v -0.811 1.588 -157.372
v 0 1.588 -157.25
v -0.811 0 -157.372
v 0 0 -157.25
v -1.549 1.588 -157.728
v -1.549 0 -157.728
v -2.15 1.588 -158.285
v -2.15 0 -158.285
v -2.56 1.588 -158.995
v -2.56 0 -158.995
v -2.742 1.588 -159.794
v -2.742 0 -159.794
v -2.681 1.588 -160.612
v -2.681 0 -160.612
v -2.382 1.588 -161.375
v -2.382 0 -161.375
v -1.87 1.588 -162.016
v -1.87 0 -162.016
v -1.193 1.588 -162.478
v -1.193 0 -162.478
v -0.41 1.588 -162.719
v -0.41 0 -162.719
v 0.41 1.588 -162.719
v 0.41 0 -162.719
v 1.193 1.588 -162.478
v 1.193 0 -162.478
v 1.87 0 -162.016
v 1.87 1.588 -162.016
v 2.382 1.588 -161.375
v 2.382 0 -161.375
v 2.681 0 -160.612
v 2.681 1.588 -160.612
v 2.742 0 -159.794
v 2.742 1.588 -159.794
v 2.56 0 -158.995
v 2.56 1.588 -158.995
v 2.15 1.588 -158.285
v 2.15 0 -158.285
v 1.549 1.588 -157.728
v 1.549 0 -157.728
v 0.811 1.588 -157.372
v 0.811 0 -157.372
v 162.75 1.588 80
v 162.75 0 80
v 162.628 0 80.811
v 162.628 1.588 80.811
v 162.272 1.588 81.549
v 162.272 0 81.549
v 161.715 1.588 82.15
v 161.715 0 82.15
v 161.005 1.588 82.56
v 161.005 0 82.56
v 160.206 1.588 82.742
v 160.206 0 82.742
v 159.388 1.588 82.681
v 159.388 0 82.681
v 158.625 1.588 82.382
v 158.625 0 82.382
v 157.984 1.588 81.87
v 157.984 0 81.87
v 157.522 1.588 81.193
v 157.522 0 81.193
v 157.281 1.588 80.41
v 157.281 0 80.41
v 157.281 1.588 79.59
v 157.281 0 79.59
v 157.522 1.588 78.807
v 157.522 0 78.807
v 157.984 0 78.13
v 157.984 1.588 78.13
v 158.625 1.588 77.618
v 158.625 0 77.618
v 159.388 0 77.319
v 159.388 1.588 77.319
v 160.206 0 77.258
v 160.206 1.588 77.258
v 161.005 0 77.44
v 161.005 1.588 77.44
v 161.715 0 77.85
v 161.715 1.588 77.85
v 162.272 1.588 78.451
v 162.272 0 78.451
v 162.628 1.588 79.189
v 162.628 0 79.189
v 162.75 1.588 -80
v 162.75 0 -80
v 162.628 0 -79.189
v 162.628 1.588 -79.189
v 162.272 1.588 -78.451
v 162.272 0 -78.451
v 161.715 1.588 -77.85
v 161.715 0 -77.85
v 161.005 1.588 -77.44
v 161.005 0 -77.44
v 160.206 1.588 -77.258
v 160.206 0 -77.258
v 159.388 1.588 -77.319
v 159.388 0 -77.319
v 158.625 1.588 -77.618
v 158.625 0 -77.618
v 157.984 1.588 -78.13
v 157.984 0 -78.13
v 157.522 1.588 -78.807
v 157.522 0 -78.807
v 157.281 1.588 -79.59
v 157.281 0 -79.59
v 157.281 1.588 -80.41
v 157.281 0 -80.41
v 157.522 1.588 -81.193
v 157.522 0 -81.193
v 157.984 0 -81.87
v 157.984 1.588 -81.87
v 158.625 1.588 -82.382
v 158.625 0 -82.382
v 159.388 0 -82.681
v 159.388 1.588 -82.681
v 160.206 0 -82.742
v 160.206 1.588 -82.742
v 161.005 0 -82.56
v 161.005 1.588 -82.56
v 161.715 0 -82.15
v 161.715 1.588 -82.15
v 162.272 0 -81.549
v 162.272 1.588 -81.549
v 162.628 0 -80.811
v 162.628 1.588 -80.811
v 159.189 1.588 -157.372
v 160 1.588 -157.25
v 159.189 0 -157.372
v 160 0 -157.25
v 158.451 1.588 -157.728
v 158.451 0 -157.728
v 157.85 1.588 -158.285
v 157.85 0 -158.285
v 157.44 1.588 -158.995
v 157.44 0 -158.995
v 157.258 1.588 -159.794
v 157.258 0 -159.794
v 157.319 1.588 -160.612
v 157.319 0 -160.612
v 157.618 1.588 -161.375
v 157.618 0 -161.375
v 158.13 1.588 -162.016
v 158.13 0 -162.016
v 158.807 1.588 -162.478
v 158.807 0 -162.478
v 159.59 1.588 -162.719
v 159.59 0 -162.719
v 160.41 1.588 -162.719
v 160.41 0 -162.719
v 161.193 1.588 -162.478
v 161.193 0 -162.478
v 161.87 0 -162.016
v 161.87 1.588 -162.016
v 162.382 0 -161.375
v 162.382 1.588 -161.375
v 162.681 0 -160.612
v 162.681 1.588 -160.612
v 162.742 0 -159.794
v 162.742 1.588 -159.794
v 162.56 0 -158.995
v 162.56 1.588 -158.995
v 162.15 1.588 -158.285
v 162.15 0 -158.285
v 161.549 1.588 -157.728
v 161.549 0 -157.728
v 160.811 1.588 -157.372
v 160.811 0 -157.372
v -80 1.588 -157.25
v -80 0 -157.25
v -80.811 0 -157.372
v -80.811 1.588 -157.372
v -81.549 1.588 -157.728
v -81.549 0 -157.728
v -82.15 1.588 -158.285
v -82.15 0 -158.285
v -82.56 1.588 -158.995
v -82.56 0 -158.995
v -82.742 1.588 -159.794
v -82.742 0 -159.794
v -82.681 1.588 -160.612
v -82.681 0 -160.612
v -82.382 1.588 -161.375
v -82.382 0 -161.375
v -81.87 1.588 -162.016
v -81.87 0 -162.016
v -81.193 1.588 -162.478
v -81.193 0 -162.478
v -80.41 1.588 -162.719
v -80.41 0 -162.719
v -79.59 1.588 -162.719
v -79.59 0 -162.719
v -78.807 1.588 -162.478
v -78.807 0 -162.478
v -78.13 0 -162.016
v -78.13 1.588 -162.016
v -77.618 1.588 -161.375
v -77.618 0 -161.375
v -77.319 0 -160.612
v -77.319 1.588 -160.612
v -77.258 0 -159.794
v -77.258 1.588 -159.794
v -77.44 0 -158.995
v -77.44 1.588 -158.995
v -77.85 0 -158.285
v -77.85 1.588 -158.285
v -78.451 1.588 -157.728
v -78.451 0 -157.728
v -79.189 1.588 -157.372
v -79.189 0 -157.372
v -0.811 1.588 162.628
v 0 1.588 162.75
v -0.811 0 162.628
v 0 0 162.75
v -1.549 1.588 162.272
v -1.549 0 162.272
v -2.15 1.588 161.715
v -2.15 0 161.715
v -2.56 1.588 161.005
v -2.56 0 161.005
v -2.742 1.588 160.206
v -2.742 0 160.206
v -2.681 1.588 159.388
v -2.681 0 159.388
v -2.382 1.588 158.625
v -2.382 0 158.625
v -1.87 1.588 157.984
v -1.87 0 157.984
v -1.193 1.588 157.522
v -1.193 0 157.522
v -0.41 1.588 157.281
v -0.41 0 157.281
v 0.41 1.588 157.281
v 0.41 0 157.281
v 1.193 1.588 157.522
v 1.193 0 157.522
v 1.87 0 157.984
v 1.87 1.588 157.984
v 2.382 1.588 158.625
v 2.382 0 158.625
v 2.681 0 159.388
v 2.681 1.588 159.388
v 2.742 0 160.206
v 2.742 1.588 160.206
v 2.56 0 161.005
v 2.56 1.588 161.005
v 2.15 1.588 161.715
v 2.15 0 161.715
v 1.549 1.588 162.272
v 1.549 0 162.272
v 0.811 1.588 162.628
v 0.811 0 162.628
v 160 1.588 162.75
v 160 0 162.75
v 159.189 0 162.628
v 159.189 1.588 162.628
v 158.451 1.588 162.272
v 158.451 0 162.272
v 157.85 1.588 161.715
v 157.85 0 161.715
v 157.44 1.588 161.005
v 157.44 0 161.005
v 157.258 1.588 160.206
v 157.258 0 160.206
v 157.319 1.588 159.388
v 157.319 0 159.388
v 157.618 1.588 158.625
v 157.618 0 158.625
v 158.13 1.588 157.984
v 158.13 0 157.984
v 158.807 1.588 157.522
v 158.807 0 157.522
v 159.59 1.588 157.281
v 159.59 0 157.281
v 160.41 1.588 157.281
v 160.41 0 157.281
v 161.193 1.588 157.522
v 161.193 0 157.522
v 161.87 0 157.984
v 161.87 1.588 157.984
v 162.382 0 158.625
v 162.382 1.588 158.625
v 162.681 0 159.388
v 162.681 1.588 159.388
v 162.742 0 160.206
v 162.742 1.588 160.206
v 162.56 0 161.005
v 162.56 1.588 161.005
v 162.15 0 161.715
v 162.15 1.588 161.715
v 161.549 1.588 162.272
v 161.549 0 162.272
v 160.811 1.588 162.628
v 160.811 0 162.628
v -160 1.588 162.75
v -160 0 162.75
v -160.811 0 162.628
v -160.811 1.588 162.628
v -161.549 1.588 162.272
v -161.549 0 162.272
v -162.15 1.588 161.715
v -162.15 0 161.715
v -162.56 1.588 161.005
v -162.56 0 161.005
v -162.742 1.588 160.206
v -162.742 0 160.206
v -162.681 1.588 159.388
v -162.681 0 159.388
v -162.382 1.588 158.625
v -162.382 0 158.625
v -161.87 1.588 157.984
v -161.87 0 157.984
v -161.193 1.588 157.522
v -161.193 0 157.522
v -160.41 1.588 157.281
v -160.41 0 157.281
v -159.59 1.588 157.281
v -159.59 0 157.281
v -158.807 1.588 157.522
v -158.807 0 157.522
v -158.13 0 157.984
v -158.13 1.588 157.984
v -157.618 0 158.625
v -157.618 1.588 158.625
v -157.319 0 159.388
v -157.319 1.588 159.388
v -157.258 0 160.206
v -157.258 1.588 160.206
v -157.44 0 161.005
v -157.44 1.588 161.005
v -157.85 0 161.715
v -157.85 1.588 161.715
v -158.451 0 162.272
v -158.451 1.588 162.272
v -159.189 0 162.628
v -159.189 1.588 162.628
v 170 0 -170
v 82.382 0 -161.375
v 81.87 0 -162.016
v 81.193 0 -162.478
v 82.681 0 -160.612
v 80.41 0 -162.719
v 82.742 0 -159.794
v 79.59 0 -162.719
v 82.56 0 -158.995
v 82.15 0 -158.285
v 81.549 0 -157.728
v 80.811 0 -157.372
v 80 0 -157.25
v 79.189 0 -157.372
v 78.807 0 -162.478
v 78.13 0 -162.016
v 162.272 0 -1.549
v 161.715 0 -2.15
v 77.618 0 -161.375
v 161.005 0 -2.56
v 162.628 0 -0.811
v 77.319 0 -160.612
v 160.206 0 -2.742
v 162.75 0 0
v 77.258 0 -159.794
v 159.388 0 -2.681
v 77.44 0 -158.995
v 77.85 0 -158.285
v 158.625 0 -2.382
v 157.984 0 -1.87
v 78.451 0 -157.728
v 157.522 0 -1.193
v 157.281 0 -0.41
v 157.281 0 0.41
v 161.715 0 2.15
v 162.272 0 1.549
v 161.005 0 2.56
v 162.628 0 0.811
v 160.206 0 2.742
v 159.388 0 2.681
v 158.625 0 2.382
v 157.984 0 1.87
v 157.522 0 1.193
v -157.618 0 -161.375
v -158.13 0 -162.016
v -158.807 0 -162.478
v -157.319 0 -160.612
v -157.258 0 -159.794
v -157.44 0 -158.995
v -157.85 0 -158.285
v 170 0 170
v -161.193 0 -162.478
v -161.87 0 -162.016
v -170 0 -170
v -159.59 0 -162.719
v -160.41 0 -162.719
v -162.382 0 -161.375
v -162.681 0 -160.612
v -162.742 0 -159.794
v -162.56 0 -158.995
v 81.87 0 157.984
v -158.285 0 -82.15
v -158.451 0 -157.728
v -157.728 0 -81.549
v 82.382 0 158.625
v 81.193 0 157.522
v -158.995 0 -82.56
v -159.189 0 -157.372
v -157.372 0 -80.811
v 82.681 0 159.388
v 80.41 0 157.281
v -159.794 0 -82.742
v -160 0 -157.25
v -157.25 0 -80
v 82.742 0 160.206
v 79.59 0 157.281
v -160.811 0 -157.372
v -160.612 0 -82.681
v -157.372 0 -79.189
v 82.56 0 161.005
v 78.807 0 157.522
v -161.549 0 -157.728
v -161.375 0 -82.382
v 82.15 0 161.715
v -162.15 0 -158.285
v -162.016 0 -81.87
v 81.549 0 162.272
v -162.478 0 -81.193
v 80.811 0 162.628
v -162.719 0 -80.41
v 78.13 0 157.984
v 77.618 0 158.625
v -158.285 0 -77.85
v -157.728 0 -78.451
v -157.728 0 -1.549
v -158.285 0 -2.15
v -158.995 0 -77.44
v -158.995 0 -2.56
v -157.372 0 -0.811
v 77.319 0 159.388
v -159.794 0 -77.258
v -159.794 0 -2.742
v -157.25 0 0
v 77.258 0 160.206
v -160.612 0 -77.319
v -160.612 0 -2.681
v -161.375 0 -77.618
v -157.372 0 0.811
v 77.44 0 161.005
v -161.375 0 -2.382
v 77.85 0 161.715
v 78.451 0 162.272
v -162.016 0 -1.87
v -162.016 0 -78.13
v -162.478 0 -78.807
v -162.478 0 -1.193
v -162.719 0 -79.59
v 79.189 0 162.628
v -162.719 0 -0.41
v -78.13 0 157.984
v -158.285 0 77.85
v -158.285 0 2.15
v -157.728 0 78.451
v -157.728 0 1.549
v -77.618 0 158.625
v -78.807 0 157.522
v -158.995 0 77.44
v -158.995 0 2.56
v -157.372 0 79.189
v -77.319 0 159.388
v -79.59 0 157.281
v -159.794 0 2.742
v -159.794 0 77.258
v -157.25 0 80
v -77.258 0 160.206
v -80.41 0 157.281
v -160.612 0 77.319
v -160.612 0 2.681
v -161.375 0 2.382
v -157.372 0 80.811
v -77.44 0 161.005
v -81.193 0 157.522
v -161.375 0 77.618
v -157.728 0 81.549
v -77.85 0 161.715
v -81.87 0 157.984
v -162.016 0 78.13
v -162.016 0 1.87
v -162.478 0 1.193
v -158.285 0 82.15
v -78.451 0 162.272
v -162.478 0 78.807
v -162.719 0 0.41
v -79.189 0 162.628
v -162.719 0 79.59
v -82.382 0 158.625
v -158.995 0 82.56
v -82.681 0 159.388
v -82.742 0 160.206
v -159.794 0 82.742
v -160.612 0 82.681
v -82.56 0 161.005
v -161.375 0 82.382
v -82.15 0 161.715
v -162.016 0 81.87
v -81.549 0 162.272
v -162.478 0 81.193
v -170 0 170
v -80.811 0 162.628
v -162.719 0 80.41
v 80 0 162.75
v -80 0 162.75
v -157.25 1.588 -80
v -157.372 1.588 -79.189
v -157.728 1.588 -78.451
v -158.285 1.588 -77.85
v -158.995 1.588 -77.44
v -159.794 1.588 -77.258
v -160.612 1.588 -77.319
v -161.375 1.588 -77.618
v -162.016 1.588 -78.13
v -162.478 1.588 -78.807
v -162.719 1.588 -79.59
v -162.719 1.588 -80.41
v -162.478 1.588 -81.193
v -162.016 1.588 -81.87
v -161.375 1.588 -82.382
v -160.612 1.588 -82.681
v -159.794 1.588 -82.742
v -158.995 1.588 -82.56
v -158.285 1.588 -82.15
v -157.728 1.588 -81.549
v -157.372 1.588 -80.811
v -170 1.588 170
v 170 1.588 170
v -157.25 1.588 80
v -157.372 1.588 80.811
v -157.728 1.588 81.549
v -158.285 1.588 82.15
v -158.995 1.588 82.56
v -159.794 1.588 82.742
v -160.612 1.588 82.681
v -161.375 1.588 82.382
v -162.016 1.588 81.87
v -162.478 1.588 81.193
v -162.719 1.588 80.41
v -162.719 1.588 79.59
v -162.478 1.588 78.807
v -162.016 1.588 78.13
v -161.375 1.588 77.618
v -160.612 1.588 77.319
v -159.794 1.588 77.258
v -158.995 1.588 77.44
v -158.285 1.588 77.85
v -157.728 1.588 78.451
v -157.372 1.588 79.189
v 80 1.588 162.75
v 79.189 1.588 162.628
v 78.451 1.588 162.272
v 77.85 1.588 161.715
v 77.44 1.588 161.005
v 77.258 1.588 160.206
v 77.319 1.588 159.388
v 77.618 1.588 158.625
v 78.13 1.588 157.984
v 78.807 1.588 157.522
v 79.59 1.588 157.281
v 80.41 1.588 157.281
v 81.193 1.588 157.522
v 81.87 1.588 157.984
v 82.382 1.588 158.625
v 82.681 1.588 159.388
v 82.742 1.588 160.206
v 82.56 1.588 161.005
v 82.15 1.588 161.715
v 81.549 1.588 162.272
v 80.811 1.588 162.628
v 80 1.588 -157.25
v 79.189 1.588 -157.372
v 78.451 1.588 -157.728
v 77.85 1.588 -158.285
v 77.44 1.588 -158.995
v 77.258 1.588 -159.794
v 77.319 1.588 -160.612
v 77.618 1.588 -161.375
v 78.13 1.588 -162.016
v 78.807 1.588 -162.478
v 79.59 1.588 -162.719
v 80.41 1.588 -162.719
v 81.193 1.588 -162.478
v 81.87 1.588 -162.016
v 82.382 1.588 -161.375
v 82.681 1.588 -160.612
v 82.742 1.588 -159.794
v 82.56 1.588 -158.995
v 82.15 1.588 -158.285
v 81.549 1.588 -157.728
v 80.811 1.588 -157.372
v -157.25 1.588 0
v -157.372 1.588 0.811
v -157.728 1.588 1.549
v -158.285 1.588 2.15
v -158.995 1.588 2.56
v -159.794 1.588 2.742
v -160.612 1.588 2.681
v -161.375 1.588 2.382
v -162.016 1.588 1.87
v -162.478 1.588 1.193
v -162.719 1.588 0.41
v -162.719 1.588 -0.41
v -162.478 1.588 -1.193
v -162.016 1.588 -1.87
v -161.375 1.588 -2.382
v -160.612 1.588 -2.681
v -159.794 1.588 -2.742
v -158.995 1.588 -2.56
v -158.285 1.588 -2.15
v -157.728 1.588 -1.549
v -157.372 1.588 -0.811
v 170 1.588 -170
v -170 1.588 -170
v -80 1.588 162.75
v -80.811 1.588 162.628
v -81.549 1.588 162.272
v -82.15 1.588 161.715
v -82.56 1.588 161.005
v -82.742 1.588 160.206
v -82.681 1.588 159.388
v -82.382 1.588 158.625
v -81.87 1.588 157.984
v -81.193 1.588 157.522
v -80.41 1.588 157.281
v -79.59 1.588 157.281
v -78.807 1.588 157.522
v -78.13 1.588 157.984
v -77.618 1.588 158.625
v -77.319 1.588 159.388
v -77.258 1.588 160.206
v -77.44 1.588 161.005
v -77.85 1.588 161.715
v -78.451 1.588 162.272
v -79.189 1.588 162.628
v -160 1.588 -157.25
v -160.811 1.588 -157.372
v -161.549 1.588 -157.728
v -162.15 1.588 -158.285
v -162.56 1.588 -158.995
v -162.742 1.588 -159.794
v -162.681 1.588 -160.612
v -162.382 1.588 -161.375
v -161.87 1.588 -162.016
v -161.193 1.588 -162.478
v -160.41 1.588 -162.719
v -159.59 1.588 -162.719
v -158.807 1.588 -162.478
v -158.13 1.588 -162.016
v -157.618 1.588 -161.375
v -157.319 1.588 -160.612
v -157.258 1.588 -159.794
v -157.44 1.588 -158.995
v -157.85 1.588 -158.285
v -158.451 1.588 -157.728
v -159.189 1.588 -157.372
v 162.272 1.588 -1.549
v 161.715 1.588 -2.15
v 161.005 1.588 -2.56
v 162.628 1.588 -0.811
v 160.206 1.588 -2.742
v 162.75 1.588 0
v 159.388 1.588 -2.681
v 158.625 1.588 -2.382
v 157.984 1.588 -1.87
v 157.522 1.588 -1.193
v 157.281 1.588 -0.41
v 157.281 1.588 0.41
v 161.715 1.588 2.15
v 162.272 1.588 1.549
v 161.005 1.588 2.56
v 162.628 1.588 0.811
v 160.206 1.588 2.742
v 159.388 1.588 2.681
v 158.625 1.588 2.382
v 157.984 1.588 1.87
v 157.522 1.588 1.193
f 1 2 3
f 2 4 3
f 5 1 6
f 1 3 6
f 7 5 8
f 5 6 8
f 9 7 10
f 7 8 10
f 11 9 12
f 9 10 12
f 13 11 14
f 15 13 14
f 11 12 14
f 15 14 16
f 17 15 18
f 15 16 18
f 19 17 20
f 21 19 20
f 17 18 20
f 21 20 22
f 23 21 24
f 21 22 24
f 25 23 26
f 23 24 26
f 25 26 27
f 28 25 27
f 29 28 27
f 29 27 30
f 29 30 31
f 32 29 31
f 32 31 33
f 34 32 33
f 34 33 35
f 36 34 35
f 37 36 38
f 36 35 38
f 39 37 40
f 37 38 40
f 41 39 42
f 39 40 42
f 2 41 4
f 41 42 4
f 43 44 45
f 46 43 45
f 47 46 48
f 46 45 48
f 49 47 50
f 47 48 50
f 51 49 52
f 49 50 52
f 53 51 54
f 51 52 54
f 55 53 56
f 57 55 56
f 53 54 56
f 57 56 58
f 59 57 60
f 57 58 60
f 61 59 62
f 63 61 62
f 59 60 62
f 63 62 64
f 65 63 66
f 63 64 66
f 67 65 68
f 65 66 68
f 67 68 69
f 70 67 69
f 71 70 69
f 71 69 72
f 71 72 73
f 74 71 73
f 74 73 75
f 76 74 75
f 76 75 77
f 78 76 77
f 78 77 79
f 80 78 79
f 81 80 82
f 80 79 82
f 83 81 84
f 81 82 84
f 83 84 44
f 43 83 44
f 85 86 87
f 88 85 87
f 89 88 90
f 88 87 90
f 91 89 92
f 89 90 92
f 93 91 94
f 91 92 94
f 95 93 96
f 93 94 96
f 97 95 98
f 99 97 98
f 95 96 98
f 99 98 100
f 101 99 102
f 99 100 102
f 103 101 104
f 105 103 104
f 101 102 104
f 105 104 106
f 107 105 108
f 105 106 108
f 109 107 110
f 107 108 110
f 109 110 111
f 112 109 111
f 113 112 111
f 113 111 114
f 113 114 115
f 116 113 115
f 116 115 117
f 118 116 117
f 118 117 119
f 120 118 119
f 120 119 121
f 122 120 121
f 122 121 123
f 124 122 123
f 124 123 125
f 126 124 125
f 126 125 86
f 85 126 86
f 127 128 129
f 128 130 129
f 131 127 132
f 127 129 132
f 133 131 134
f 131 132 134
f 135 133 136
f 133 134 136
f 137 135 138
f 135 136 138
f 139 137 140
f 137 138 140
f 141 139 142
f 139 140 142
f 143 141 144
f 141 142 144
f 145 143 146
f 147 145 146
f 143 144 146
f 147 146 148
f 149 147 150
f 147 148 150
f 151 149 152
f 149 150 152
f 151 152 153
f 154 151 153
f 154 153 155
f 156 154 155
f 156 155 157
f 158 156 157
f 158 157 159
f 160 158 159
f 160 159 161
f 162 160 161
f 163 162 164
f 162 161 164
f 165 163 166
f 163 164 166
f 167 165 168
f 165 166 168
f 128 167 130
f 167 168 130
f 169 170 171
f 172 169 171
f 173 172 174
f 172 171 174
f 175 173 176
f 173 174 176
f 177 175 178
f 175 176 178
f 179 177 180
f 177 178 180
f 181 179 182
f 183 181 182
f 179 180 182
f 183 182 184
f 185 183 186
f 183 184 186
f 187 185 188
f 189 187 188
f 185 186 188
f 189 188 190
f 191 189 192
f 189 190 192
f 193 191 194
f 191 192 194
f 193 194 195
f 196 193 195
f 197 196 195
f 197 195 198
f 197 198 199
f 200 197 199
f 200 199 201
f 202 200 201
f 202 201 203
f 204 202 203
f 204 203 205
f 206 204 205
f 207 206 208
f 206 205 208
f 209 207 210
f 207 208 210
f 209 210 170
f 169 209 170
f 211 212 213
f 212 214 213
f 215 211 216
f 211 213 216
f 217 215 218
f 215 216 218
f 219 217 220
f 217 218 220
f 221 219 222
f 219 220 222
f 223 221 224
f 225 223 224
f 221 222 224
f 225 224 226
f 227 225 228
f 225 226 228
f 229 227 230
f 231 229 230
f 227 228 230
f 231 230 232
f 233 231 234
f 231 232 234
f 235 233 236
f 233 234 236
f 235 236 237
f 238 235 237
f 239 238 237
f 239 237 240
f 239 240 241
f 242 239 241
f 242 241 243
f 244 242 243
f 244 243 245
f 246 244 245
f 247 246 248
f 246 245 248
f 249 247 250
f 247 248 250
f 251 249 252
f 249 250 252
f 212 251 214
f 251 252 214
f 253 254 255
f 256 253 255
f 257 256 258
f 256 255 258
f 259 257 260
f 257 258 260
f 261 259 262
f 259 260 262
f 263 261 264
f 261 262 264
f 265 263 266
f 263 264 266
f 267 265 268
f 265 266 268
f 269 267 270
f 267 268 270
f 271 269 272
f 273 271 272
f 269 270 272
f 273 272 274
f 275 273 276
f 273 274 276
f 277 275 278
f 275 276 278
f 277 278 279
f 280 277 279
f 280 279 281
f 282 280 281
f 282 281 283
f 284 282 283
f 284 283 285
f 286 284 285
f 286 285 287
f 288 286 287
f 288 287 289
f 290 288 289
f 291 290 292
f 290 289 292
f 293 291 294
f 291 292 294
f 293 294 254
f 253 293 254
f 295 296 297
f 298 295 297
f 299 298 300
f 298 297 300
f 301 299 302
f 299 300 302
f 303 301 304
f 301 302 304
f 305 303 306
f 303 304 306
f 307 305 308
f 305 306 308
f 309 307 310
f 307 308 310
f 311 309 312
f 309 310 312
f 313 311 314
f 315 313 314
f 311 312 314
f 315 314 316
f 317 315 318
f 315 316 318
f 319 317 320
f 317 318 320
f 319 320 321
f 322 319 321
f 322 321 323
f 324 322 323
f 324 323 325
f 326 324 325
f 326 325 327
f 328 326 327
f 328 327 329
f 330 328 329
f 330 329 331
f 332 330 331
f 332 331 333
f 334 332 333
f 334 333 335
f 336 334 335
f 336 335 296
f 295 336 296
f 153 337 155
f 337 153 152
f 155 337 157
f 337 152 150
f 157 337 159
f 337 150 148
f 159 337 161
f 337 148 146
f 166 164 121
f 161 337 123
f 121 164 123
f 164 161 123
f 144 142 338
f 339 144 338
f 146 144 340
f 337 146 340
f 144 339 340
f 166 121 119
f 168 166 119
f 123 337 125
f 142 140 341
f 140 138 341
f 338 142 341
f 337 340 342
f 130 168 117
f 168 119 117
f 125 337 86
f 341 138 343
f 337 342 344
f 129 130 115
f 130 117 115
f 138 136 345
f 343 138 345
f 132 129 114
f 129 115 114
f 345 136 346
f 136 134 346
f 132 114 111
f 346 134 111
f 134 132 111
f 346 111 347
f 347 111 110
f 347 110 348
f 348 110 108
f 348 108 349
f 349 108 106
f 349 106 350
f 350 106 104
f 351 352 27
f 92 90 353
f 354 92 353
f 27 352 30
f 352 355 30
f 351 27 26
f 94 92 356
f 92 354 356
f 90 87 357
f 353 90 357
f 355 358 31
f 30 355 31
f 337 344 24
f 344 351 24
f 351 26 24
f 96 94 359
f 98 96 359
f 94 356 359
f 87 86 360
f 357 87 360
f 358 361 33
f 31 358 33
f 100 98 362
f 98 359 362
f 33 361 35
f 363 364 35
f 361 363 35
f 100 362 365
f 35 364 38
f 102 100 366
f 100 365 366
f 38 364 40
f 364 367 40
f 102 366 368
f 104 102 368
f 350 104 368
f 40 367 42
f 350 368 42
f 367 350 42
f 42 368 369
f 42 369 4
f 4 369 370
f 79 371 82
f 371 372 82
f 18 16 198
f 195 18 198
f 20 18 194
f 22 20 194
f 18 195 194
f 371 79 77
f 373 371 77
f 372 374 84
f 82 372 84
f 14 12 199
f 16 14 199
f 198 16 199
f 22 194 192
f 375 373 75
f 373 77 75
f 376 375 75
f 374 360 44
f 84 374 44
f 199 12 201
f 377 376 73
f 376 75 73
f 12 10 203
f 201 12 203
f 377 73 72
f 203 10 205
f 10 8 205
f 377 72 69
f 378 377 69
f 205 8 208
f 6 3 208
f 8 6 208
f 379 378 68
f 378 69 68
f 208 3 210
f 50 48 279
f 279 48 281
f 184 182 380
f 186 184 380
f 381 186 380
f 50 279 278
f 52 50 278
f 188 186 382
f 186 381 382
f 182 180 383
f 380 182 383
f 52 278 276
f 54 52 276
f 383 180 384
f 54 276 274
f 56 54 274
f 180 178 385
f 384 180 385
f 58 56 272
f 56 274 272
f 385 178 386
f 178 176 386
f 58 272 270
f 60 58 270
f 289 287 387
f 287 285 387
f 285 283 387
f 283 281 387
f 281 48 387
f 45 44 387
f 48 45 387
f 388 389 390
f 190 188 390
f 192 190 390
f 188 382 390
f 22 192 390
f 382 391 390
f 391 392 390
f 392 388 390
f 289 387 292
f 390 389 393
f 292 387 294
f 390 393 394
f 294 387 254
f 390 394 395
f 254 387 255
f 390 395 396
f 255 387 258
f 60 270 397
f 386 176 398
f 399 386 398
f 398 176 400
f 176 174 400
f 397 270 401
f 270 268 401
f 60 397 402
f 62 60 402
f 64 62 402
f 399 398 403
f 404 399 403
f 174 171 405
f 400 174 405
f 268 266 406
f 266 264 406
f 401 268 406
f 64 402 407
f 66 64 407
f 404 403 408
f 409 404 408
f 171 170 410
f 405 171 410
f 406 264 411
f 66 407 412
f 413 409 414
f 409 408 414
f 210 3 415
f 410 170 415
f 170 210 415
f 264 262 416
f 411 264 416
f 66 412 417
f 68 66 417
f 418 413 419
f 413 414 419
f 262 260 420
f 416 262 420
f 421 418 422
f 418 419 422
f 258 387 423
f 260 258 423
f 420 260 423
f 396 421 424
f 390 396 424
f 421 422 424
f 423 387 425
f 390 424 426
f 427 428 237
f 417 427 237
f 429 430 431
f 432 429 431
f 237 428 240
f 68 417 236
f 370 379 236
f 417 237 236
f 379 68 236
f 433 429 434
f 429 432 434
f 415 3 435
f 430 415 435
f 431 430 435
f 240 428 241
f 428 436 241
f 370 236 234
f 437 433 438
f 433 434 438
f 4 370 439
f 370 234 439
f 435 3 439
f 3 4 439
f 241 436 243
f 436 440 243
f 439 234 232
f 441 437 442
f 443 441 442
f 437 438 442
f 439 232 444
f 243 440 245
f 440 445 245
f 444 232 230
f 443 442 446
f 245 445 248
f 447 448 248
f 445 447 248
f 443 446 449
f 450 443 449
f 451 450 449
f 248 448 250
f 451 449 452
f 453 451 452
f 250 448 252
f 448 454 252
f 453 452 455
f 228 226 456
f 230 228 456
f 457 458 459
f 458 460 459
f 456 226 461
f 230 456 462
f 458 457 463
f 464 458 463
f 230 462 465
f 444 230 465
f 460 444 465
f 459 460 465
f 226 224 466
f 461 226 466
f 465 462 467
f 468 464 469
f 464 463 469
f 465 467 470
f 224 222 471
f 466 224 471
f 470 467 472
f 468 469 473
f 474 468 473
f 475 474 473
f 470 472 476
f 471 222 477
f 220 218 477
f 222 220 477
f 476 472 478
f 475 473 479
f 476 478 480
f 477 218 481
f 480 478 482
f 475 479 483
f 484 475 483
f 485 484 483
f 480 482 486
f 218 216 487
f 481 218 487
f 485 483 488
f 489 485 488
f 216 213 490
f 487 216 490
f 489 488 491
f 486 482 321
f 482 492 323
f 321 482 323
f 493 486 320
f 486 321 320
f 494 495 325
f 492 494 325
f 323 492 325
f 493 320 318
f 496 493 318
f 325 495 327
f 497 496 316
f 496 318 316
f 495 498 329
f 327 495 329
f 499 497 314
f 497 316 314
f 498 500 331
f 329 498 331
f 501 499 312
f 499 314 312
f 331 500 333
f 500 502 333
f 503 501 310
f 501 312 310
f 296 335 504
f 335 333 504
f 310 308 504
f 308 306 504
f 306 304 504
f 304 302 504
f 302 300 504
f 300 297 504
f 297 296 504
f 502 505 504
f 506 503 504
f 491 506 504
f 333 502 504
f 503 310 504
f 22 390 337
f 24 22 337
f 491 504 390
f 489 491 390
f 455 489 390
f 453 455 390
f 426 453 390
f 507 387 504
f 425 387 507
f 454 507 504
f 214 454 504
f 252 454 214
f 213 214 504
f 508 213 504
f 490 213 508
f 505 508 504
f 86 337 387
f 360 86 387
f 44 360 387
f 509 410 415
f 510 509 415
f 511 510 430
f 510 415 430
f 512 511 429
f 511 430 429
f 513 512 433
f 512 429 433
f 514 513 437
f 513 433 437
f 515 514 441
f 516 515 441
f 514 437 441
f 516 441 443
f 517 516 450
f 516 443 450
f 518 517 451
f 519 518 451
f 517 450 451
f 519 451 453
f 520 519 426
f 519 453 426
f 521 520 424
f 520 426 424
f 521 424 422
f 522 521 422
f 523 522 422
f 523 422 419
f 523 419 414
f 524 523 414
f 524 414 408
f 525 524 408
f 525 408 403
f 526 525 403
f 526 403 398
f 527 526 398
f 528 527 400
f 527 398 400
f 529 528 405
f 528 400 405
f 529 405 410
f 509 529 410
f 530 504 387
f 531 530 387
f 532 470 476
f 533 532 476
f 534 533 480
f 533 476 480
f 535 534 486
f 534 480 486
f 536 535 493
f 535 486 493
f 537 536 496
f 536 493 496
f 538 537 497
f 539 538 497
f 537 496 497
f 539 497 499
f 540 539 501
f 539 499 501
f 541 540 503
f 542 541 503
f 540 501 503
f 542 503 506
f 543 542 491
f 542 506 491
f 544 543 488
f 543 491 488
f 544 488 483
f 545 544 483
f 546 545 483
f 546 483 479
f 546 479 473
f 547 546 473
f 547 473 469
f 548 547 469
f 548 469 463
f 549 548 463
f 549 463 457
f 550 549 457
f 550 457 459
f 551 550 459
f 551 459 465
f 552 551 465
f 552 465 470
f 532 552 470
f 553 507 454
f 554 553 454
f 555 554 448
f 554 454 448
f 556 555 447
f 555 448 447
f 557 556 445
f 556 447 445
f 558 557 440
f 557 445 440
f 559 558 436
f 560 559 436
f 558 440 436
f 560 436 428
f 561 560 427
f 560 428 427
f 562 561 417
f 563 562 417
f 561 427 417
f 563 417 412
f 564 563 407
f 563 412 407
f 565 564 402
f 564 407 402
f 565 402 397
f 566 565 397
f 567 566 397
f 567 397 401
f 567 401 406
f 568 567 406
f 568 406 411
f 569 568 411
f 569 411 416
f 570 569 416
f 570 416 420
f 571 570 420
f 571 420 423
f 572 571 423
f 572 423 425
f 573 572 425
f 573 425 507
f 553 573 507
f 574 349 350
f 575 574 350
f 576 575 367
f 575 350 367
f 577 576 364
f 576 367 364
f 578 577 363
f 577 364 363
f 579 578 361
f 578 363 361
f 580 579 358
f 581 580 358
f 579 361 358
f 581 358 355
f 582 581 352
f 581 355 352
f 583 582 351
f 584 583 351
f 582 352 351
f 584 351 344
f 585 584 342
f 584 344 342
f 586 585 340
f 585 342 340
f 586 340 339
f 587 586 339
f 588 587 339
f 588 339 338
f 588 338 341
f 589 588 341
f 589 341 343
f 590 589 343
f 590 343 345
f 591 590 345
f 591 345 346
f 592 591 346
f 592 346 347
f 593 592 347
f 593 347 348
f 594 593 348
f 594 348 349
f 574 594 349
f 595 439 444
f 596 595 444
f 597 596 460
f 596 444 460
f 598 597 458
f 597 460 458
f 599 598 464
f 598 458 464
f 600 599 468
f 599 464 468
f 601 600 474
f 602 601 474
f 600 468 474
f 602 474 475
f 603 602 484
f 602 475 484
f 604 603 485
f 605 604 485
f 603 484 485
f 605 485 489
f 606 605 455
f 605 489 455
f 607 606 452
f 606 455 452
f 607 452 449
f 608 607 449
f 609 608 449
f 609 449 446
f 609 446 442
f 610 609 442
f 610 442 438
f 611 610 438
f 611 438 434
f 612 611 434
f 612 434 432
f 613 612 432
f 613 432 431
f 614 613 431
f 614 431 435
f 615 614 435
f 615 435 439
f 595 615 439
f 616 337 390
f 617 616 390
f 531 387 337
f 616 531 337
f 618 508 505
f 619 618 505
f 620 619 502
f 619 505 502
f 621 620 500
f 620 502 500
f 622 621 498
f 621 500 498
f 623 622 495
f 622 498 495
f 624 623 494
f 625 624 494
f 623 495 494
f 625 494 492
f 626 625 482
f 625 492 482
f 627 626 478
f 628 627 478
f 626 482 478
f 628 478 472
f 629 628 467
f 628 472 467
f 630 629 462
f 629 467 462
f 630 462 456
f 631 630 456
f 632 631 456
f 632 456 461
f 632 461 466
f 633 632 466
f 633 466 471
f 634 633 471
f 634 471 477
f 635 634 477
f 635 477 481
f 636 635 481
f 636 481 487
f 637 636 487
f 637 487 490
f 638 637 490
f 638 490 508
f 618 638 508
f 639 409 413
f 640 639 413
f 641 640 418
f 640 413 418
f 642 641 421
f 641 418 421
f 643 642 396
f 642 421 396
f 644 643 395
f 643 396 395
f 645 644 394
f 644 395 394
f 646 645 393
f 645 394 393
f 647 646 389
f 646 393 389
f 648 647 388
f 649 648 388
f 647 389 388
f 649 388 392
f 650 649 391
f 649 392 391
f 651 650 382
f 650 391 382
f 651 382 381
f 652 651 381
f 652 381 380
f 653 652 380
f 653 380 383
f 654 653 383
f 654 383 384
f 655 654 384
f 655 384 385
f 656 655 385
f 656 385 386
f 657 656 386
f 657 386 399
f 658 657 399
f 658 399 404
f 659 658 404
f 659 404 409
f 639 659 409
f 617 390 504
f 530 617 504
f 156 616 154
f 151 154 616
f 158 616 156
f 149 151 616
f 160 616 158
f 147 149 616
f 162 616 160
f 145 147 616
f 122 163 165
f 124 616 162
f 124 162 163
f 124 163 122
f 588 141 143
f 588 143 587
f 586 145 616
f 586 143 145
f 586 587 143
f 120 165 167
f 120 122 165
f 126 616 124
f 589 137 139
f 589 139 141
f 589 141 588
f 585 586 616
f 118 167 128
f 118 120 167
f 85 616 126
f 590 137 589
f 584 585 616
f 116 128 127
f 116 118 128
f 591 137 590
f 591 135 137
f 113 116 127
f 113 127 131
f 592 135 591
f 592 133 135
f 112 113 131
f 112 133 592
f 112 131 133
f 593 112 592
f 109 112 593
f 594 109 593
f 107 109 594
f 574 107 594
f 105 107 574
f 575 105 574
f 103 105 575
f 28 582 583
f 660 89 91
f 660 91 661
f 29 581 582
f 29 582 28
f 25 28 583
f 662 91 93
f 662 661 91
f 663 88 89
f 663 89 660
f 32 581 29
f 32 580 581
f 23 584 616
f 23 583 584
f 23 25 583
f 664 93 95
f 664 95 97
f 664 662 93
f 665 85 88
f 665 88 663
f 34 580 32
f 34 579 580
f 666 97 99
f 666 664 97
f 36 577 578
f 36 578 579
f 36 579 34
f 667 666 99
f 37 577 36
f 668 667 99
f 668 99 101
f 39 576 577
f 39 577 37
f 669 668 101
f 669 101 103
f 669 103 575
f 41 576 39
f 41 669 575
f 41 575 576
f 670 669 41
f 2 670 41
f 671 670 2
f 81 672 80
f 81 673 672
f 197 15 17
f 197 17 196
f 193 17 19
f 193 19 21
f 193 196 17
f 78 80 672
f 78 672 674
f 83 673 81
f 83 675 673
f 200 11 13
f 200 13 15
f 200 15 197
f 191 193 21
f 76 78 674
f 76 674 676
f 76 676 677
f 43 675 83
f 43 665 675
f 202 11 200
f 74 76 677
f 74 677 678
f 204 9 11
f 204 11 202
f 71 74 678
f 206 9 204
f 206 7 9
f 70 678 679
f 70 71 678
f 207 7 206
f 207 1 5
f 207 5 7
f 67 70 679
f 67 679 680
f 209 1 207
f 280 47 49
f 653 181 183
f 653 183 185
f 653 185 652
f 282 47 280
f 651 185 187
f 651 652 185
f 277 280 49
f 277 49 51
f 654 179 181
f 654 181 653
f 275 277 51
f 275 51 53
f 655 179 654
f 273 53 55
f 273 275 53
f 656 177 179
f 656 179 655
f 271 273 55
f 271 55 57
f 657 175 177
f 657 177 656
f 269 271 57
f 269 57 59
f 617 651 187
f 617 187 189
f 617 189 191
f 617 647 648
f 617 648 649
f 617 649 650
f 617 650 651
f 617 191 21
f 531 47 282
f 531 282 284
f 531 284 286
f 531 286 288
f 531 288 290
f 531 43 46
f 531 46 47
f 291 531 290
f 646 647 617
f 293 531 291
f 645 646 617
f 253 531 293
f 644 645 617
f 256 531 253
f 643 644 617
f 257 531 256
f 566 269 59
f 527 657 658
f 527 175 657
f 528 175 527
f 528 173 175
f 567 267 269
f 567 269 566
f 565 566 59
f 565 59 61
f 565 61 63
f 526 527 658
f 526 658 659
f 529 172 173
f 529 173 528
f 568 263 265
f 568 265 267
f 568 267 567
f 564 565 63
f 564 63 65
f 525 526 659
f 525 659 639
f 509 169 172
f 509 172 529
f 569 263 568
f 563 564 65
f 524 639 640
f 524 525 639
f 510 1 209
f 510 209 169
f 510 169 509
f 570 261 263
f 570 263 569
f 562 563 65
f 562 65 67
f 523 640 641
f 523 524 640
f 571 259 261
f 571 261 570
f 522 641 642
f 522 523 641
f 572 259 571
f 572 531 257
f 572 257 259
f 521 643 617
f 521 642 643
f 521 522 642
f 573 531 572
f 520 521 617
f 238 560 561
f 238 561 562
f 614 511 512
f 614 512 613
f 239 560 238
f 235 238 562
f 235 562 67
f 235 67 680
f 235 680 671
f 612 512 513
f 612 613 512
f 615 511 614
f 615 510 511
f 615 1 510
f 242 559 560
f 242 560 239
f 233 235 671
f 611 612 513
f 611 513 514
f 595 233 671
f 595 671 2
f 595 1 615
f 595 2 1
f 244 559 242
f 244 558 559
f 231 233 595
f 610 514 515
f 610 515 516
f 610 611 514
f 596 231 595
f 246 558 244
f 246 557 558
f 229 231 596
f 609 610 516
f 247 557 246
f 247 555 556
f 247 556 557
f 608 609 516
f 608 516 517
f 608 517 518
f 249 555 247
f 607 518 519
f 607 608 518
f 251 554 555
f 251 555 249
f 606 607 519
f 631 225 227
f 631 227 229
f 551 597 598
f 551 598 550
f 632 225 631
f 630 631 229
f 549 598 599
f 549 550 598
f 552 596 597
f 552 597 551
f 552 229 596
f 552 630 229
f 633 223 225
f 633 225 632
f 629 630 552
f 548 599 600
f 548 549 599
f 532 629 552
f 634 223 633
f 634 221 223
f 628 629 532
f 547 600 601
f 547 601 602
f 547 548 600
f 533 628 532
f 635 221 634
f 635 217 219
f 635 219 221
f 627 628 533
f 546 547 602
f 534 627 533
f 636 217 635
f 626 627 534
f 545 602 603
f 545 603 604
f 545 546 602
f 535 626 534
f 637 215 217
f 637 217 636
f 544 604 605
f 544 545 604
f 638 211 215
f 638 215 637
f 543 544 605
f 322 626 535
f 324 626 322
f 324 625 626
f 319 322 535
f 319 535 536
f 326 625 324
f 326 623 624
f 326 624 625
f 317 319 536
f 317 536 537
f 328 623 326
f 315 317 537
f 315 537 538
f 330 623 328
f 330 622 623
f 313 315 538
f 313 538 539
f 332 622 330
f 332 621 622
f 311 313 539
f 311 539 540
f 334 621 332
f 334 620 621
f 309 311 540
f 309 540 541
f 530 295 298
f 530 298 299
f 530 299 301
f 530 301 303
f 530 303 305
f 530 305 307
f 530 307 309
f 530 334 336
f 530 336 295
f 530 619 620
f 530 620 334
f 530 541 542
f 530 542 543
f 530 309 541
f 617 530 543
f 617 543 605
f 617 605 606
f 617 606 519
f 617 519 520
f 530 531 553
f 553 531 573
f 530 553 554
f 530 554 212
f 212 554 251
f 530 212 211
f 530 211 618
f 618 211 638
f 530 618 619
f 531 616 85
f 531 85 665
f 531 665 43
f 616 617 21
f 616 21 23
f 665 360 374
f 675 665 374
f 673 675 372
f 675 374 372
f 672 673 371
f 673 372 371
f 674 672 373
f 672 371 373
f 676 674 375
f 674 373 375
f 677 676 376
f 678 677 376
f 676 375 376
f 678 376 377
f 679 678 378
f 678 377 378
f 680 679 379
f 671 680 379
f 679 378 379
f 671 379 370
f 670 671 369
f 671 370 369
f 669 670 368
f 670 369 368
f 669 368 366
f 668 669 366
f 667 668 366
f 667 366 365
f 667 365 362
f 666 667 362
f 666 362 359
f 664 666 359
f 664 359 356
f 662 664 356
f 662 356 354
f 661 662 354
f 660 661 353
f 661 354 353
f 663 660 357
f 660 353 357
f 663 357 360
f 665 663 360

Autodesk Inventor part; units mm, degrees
ref_plane "YZ Plane" through (0, 0, 0) normal (1, 0, 0) x (0, 1, 0)
ref_plane "XZ Plane" through (0, 0, 0) normal (0, 1, 0) x (-1, 0, 0)
ref_plane "XY Plane" through (0, 0, 0) normal (0, 0, 1) x (1, 0, 0)
sketch "Sketch1" plane through (0, 0, 0) normal (0, 1, 0) x (-1, 0, 0)
  line L0 (170, 170) -> (-170, 170)
  line L1 (-170, 170) -> (-170, -170)
  line L2 (-170, -170) -> (170, -170)
  line L3 (170, -170) -> (170, 170)
  line L4 (170, 170) -> (-170, -170) construction
  line L5 (-170, 170) -> (170, -170) construction
  point P0 (0, 0)
  dimension "d0" = 340
  dimension "d1" = 340
extrude "Extrusion1" add sketch "Sketch1" along normal blind 1.5875
sketch "Sketch2" plane through (0, 1.5875, 0) normal (0, 1, 0) x (1, 0, 0)
  line L0 (-170, -170) -> (170, -170) projected
  line L1 (170, -170) -> (170, 170) projected
  line L2 (170, 170) -> (-170, 170) projected
  line L3 (-170, 170) -> (-170, -170) projected
  point P0 (0, 0)
  point P1 (-160, -160)
  dimension "d4" = 10
  dimension "d5" = 10
hole "Hole1" at (-160, 1.5875, 160) direction (0, -1, 0) diameter 5.5 end through all clearance for "Hex Head Bolt" size "M5" standard "Ansi Metric M Profile"
pattern_linear "Rectangular Pattern1" count 2 spacing 320 along (0, 0, -1) count 5 spacing 80 along (1, 0, 0) of "Hole1"
pattern_circular "Circular Pattern1" count 2 over 90 about axis through (0, -10, 0) along (0, 1, 0) of "Hole1", "Rectangular Pattern1"
equation "\"d2\" = facingGasketThickness"
equation "\"facingThickness\" = 12.7"
equation "\"facingGasketThickness\" = 1.5875"
properties part number "frontBackGasket" material "Rubber"
